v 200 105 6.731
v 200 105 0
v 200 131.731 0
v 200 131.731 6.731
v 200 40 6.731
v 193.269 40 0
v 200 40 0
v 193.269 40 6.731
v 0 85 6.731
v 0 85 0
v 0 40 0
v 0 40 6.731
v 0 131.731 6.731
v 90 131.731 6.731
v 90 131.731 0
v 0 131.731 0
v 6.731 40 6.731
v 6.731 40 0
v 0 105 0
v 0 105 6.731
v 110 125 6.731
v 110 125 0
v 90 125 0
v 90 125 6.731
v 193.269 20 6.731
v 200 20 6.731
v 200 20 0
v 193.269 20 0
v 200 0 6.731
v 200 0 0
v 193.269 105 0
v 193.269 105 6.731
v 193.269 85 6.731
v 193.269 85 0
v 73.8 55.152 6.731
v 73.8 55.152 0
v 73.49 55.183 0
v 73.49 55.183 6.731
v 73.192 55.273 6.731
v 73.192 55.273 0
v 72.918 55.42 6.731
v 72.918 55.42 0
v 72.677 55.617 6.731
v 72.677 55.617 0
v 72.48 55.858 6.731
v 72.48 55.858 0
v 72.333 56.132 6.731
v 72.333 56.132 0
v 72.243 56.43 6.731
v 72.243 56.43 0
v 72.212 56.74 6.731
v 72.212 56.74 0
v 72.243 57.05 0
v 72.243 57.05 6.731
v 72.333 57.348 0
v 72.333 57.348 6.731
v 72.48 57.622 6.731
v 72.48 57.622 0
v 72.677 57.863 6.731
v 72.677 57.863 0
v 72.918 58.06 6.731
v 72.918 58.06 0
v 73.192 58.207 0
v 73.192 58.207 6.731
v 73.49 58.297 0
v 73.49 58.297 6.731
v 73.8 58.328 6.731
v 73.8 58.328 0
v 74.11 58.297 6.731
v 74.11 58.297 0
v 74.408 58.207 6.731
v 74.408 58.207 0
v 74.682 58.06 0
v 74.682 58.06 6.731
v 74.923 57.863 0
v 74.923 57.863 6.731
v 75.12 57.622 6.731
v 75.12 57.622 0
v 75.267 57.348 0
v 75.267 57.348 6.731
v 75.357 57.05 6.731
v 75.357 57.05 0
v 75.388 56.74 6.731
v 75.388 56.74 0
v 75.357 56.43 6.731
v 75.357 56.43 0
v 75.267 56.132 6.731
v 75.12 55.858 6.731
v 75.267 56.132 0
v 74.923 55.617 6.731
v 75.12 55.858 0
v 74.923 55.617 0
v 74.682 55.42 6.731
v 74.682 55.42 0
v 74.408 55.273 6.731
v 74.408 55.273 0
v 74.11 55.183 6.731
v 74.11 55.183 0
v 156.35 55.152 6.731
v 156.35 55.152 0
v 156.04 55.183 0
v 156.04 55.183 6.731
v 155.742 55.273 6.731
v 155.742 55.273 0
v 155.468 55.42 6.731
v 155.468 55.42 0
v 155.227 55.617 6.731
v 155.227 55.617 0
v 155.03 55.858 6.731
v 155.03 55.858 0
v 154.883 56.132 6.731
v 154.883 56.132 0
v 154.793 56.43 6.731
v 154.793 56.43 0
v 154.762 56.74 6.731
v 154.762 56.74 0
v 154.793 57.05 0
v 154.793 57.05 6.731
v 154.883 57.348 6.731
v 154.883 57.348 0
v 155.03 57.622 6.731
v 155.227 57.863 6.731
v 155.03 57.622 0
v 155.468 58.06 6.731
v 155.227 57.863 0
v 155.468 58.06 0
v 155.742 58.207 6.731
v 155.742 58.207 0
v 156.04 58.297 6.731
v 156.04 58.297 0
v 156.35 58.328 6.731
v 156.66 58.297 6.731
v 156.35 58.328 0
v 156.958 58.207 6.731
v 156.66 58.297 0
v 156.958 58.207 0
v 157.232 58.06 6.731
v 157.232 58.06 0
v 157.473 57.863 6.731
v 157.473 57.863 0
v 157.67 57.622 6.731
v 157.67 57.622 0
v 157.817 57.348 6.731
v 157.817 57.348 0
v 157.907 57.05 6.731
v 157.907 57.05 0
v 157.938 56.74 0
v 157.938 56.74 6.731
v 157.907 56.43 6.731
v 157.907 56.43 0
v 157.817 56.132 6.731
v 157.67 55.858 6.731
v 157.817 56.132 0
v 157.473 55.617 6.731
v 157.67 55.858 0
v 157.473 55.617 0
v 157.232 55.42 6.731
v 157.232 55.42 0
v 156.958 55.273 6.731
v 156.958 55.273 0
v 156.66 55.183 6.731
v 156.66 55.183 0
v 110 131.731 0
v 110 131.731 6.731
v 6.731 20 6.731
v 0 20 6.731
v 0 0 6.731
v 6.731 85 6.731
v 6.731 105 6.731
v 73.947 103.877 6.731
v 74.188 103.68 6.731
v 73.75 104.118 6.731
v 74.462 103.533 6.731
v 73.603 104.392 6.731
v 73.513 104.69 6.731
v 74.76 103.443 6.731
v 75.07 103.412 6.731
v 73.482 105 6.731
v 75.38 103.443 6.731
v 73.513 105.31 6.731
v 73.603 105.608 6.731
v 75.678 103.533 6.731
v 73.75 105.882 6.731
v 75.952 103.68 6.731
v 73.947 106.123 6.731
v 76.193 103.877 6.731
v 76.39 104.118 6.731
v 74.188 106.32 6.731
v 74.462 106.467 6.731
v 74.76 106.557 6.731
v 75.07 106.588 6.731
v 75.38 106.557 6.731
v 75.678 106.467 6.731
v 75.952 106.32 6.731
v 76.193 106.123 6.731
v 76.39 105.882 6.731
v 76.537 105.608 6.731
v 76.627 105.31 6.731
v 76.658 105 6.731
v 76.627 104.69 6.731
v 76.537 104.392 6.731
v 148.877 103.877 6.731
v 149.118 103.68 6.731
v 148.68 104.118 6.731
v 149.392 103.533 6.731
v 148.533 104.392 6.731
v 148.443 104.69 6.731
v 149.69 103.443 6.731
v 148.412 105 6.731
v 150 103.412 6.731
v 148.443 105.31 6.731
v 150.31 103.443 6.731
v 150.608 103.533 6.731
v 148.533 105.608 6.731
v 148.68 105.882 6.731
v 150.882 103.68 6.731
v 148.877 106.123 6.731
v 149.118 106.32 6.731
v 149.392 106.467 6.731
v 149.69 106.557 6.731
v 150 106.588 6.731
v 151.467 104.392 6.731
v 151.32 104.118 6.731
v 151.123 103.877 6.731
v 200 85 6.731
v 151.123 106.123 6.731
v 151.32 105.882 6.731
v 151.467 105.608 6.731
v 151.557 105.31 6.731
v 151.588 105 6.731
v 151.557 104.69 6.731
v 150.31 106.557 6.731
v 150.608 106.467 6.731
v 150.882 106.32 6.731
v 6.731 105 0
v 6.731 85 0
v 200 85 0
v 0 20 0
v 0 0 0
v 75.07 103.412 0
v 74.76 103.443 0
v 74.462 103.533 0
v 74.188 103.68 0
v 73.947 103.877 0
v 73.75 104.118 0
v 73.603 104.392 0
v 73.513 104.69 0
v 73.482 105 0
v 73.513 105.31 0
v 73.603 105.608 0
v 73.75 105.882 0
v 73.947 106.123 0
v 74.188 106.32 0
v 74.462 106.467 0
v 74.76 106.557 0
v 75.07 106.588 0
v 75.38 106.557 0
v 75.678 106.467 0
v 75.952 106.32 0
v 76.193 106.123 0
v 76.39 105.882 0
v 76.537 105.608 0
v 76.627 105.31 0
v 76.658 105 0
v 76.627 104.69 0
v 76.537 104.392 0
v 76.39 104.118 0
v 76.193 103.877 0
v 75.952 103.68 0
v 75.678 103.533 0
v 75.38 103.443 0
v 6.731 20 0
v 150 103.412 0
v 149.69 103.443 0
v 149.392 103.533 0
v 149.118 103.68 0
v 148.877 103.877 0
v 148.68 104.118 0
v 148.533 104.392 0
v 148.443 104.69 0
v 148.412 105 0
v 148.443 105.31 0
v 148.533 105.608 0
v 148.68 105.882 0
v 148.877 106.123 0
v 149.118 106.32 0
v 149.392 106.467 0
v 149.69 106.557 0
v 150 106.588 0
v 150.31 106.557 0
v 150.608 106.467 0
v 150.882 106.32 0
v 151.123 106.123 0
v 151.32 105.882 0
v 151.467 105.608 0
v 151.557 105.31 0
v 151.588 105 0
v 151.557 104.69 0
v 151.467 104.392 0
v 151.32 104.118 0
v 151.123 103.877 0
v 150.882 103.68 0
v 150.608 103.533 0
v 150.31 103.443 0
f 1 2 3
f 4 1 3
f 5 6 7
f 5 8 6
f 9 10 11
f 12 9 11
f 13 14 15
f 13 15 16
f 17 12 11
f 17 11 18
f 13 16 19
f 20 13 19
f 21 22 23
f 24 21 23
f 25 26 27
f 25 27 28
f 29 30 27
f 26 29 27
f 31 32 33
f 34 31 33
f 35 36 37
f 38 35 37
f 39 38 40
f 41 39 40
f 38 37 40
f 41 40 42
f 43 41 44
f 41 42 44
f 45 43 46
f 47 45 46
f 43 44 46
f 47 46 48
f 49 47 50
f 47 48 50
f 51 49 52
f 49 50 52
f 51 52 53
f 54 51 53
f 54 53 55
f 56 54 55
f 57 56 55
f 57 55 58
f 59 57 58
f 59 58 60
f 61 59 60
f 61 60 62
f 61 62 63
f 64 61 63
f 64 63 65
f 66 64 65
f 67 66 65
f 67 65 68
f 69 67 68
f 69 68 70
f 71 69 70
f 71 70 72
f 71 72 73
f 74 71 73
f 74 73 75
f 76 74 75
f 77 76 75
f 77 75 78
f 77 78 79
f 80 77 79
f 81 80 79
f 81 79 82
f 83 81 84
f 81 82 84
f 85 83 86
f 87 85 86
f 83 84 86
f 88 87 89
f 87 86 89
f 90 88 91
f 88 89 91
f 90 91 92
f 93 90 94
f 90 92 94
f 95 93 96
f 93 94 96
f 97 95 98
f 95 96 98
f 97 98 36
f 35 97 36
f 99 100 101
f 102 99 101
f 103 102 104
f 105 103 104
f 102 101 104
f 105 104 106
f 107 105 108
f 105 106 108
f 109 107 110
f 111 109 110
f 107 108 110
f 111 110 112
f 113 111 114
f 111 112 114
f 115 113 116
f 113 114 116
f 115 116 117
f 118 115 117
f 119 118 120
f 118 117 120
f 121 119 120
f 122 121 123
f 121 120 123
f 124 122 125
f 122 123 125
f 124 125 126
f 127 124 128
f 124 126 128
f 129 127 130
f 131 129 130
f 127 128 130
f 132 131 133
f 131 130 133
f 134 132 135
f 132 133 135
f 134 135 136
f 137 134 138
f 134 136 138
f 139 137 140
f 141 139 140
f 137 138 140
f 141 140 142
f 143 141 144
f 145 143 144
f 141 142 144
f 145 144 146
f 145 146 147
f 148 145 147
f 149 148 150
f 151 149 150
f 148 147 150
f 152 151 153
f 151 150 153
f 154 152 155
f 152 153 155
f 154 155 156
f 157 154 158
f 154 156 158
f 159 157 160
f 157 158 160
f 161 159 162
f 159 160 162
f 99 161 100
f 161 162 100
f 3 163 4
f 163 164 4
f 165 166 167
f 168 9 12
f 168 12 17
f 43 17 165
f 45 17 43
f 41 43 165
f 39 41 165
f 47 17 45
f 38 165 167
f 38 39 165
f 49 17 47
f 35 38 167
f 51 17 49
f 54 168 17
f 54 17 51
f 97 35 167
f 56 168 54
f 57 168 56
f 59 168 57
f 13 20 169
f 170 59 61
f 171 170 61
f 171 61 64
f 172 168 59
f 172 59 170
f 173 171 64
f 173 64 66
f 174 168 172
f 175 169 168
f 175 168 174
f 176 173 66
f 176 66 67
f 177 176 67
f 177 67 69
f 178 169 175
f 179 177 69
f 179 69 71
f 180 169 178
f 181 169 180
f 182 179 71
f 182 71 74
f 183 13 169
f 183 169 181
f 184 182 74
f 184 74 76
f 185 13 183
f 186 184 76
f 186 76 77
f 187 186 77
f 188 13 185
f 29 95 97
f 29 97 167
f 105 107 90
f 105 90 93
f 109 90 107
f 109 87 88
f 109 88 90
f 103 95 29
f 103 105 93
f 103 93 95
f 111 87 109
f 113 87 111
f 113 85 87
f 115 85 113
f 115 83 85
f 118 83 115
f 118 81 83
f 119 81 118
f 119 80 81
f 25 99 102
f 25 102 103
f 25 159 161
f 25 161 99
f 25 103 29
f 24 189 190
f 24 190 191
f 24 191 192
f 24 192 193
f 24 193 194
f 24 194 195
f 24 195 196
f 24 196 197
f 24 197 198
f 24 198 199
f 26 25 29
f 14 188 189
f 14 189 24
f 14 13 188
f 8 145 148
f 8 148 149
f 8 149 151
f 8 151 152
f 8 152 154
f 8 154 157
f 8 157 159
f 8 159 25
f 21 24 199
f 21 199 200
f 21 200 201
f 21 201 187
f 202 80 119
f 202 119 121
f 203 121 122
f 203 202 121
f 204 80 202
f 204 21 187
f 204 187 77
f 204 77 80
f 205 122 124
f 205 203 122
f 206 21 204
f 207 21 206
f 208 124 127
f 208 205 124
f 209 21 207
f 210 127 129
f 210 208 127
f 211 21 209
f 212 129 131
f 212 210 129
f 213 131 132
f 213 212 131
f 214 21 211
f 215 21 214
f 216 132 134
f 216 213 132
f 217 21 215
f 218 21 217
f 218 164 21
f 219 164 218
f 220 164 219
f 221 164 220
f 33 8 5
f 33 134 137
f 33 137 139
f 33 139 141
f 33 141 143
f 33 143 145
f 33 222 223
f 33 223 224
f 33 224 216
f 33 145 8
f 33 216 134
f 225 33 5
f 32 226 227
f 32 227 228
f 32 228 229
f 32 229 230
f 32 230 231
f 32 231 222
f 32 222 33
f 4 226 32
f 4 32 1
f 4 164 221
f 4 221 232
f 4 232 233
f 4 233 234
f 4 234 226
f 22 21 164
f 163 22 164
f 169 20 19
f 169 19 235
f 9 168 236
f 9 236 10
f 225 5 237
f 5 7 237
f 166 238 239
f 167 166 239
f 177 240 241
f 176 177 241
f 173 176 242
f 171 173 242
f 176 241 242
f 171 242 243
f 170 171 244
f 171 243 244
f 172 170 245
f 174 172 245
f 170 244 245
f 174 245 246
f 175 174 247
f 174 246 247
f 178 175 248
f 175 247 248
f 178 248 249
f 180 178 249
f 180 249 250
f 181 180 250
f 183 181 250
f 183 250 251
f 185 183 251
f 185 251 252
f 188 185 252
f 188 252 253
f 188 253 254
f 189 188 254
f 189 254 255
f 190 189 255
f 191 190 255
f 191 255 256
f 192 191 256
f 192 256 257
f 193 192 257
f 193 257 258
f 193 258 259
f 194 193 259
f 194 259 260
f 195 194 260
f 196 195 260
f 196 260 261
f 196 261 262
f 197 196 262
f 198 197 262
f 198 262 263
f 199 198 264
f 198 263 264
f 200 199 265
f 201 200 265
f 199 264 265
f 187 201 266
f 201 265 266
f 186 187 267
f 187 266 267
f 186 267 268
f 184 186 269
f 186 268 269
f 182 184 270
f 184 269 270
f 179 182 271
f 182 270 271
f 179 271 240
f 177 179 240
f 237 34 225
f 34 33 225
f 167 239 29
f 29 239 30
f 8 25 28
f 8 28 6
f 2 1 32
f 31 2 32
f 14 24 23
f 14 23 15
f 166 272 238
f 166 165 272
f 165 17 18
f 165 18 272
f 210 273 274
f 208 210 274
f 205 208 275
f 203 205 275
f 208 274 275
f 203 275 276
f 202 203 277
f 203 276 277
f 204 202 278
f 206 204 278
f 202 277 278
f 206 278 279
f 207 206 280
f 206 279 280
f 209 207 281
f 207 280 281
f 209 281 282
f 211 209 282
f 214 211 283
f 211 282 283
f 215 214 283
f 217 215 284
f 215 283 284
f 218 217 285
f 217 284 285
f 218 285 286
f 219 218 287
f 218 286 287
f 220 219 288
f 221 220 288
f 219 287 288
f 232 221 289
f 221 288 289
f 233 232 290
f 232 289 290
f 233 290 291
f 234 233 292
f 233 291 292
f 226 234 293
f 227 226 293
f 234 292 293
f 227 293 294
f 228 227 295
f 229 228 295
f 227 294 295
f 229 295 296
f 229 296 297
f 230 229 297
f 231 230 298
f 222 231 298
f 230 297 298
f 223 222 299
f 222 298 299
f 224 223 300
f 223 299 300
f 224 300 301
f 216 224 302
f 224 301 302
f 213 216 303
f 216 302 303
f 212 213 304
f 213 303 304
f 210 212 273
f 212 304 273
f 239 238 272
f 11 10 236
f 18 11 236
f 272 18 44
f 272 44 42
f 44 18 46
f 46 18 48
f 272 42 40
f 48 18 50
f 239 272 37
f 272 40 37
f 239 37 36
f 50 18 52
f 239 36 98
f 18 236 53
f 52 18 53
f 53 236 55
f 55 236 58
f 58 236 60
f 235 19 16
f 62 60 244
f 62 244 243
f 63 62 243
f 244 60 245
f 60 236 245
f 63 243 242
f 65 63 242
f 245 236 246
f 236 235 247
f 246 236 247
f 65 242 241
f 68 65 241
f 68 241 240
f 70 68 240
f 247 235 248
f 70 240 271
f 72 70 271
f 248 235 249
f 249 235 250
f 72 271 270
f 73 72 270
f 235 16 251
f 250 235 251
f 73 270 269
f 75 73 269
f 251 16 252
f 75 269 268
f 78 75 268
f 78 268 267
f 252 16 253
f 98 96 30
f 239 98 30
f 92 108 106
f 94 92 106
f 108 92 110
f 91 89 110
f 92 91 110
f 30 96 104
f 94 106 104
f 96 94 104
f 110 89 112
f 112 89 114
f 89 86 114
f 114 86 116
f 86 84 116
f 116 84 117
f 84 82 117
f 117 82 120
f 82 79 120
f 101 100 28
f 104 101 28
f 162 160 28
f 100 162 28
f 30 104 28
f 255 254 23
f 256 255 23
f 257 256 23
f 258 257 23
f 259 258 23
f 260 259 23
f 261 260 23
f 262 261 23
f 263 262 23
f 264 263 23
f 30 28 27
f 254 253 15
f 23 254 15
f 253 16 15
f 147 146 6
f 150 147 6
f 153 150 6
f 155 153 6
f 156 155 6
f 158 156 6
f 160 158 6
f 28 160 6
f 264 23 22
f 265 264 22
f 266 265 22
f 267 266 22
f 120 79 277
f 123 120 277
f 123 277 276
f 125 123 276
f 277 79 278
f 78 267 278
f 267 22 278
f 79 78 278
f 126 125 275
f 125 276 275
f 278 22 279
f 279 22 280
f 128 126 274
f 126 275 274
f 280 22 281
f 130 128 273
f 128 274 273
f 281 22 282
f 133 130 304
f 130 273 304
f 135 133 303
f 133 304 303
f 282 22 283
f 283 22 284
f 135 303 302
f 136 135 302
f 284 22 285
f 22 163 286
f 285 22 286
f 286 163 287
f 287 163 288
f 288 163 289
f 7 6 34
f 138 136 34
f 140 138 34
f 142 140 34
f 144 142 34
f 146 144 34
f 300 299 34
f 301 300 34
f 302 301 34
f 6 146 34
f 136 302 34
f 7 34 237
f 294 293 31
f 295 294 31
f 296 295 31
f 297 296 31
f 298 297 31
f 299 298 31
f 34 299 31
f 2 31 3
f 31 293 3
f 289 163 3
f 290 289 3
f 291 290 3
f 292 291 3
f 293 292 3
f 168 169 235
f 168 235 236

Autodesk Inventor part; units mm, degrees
ref_plane "YZ Plane" through (0, 0, 0) normal (1, 0, 0) x (0, 1, 0)
ref_plane "XZ Plane" through (0, 0, 0) normal (0, 1, 0) x (-1, 0, 0)
ref_plane "XY Plane" through (0, 0, 0) normal (0, 0, 1) x (1, 0, 0)
sketch "Sketch1" plane through (0, 0, 0) normal (0, 0, 1) x (1, 0, 0)
  line L0 (0, 0) -> (200, 0)
  line L1 (200, 0) -> (200, 125)
  line L2 (200, 125) -> (0, 125)
  line L3 (0, 125) -> (0, 0)
  dimension "d23" = 200
  dimension "d24" = 125
extrude "Extrusion1" add sketch "Sketch1" along normal blind 6.731
sketch "Sketch2" plane through (0, 0, 6.731) normal (0, 0, 1) x (1, 0, 0)
  line L0 (75.07, 105) -> (150, 105) construction
  line L1 (150, 105) -> (156.35, 105) construction
  line L2 (156.35, 105) -> (156.35, 56.74) construction
  line L3 (156.35, 56.74) -> (73.8, 56.74) construction
  line L4 (73.8, 56.74) -> (73.8, 105) construction
  line L5 (73.8, 105) -> (75.07, 105) construction
  line L6 (200, 0) -> (200, 125) projected
  line L7 (200, 125) -> (0, 125) projected
  dimension "d7" = 1.27
  dimension "d8" = 74.93
  dimension "d9" = 48.26
  dimension "d10" = 82.55
  dimension "d32" = 20
  dimension "d33" = 50
hole "Hole1" at (75.07, 105, 6.731) at (73.8, 56.74, 6.731) at (156.35, 56.74, 6.731) at (150, 105, 6.731) direction (0, 0, -1) diameter 3.176 end through all
sketch "Sketch3" plane through (0, 0, 6.731) normal (0, 0, 1) x (1, 0, 0)
  line L0 (200, 0) -> (200, 125) projected
  line L1 (0, 125) -> (0, 0) projected
  line L2 (0, 40) -> (6.731, 40)
  line L3 (6.731, 40) -> (6.731, 20)
  line L4 (6.731, 20) -> (0, 20)
  line L5 (0, 20) -> (0, 40)
  line L6 (200, 20) -> (193.269, 20)
  line L7 (193.269, 20) -> (193.269, 40)
  line L8 (193.269, 40) -> (200, 40)
  line L9 (200, 40) -> (200, 20)
  line L10 (0, 0) -> (200, 0) projected
  line L11 (0, 105) -> (6.731, 105)
  line L12 (6.731, 105) -> (6.731, 85)
  line L13 (6.731, 85) -> (0, 85)
  line L14 (0, 85) -> (0, 105)
  line L15 (200, 105) -> (193.269, 105)
  line L16 (193.269, 105) -> (193.269, 85)
  line L17 (193.269, 85) -> (200, 85)
  line L18 (200, 85) -> (200, 105)
  line L19 (90, 0) -> (110, 0)
  line L20 (110, 0) -> (110, 6.731)
  line L21 (110, 6.731) -> (90, 6.731)
  line L22 (90, 6.731) -> (90, 0)
  line L23 (200, 125) -> (0, 125) projected
  point P0 (100, 6.731)
  point P1 (100, 0)
  dimension "d19" = 6.731
  dimension "d20" = 20
  dimension "d25" = 20
  dimension "d28" = 20
extrude "Tabs" cut sketch "Sketch3" against normal up to next contours L6 L7 L8 L0 | L17 L16 L15 L0 | L1 L2 L3 L4 | L1 L11 L12 L13
sketch "Sketch4" plane through (0, 0, 6.731) normal (0, 0, 1) x (1, 0, 0)
  line L0 (0, 105) -> (6.731, 105) projected
  line L1 (0, 125) -> (90, 125)
  line L2 (90, 125) -> (90, 131.731)
  line L3 (90, 131.731) -> (0, 131.731)
  line L4 (0, 131.731) -> (0, 125)
  line L5 (200, 125) -> (110, 125)
  line L6 (110, 125) -> (110, 131.731)
  line L7 (110, 131.731) -> (200, 131.731)
  line L8 (200, 131.731) -> (200, 125)
  dimension "d29" = 20
extrude "Extrusion3" add sketch "Sketch4" against normal blind 6.731
equation "\"d0\" = THICKB"
equation "\"d19\" = THICKB"
equation "\"d21\" = THICKB"
equation "\"d30\" = THICKB"
equation "\"THICKA\" = 3.175"
equation "\"THICKB\" = 6.731"
equation "\"THICKC\" = 12.7"
equation "\"THICKPLY\" = 5"
equation "\"MAGDIA\" = 9.5"
equation "\"BALLDIA\" = 12"
properties part number "Controller_Base"
